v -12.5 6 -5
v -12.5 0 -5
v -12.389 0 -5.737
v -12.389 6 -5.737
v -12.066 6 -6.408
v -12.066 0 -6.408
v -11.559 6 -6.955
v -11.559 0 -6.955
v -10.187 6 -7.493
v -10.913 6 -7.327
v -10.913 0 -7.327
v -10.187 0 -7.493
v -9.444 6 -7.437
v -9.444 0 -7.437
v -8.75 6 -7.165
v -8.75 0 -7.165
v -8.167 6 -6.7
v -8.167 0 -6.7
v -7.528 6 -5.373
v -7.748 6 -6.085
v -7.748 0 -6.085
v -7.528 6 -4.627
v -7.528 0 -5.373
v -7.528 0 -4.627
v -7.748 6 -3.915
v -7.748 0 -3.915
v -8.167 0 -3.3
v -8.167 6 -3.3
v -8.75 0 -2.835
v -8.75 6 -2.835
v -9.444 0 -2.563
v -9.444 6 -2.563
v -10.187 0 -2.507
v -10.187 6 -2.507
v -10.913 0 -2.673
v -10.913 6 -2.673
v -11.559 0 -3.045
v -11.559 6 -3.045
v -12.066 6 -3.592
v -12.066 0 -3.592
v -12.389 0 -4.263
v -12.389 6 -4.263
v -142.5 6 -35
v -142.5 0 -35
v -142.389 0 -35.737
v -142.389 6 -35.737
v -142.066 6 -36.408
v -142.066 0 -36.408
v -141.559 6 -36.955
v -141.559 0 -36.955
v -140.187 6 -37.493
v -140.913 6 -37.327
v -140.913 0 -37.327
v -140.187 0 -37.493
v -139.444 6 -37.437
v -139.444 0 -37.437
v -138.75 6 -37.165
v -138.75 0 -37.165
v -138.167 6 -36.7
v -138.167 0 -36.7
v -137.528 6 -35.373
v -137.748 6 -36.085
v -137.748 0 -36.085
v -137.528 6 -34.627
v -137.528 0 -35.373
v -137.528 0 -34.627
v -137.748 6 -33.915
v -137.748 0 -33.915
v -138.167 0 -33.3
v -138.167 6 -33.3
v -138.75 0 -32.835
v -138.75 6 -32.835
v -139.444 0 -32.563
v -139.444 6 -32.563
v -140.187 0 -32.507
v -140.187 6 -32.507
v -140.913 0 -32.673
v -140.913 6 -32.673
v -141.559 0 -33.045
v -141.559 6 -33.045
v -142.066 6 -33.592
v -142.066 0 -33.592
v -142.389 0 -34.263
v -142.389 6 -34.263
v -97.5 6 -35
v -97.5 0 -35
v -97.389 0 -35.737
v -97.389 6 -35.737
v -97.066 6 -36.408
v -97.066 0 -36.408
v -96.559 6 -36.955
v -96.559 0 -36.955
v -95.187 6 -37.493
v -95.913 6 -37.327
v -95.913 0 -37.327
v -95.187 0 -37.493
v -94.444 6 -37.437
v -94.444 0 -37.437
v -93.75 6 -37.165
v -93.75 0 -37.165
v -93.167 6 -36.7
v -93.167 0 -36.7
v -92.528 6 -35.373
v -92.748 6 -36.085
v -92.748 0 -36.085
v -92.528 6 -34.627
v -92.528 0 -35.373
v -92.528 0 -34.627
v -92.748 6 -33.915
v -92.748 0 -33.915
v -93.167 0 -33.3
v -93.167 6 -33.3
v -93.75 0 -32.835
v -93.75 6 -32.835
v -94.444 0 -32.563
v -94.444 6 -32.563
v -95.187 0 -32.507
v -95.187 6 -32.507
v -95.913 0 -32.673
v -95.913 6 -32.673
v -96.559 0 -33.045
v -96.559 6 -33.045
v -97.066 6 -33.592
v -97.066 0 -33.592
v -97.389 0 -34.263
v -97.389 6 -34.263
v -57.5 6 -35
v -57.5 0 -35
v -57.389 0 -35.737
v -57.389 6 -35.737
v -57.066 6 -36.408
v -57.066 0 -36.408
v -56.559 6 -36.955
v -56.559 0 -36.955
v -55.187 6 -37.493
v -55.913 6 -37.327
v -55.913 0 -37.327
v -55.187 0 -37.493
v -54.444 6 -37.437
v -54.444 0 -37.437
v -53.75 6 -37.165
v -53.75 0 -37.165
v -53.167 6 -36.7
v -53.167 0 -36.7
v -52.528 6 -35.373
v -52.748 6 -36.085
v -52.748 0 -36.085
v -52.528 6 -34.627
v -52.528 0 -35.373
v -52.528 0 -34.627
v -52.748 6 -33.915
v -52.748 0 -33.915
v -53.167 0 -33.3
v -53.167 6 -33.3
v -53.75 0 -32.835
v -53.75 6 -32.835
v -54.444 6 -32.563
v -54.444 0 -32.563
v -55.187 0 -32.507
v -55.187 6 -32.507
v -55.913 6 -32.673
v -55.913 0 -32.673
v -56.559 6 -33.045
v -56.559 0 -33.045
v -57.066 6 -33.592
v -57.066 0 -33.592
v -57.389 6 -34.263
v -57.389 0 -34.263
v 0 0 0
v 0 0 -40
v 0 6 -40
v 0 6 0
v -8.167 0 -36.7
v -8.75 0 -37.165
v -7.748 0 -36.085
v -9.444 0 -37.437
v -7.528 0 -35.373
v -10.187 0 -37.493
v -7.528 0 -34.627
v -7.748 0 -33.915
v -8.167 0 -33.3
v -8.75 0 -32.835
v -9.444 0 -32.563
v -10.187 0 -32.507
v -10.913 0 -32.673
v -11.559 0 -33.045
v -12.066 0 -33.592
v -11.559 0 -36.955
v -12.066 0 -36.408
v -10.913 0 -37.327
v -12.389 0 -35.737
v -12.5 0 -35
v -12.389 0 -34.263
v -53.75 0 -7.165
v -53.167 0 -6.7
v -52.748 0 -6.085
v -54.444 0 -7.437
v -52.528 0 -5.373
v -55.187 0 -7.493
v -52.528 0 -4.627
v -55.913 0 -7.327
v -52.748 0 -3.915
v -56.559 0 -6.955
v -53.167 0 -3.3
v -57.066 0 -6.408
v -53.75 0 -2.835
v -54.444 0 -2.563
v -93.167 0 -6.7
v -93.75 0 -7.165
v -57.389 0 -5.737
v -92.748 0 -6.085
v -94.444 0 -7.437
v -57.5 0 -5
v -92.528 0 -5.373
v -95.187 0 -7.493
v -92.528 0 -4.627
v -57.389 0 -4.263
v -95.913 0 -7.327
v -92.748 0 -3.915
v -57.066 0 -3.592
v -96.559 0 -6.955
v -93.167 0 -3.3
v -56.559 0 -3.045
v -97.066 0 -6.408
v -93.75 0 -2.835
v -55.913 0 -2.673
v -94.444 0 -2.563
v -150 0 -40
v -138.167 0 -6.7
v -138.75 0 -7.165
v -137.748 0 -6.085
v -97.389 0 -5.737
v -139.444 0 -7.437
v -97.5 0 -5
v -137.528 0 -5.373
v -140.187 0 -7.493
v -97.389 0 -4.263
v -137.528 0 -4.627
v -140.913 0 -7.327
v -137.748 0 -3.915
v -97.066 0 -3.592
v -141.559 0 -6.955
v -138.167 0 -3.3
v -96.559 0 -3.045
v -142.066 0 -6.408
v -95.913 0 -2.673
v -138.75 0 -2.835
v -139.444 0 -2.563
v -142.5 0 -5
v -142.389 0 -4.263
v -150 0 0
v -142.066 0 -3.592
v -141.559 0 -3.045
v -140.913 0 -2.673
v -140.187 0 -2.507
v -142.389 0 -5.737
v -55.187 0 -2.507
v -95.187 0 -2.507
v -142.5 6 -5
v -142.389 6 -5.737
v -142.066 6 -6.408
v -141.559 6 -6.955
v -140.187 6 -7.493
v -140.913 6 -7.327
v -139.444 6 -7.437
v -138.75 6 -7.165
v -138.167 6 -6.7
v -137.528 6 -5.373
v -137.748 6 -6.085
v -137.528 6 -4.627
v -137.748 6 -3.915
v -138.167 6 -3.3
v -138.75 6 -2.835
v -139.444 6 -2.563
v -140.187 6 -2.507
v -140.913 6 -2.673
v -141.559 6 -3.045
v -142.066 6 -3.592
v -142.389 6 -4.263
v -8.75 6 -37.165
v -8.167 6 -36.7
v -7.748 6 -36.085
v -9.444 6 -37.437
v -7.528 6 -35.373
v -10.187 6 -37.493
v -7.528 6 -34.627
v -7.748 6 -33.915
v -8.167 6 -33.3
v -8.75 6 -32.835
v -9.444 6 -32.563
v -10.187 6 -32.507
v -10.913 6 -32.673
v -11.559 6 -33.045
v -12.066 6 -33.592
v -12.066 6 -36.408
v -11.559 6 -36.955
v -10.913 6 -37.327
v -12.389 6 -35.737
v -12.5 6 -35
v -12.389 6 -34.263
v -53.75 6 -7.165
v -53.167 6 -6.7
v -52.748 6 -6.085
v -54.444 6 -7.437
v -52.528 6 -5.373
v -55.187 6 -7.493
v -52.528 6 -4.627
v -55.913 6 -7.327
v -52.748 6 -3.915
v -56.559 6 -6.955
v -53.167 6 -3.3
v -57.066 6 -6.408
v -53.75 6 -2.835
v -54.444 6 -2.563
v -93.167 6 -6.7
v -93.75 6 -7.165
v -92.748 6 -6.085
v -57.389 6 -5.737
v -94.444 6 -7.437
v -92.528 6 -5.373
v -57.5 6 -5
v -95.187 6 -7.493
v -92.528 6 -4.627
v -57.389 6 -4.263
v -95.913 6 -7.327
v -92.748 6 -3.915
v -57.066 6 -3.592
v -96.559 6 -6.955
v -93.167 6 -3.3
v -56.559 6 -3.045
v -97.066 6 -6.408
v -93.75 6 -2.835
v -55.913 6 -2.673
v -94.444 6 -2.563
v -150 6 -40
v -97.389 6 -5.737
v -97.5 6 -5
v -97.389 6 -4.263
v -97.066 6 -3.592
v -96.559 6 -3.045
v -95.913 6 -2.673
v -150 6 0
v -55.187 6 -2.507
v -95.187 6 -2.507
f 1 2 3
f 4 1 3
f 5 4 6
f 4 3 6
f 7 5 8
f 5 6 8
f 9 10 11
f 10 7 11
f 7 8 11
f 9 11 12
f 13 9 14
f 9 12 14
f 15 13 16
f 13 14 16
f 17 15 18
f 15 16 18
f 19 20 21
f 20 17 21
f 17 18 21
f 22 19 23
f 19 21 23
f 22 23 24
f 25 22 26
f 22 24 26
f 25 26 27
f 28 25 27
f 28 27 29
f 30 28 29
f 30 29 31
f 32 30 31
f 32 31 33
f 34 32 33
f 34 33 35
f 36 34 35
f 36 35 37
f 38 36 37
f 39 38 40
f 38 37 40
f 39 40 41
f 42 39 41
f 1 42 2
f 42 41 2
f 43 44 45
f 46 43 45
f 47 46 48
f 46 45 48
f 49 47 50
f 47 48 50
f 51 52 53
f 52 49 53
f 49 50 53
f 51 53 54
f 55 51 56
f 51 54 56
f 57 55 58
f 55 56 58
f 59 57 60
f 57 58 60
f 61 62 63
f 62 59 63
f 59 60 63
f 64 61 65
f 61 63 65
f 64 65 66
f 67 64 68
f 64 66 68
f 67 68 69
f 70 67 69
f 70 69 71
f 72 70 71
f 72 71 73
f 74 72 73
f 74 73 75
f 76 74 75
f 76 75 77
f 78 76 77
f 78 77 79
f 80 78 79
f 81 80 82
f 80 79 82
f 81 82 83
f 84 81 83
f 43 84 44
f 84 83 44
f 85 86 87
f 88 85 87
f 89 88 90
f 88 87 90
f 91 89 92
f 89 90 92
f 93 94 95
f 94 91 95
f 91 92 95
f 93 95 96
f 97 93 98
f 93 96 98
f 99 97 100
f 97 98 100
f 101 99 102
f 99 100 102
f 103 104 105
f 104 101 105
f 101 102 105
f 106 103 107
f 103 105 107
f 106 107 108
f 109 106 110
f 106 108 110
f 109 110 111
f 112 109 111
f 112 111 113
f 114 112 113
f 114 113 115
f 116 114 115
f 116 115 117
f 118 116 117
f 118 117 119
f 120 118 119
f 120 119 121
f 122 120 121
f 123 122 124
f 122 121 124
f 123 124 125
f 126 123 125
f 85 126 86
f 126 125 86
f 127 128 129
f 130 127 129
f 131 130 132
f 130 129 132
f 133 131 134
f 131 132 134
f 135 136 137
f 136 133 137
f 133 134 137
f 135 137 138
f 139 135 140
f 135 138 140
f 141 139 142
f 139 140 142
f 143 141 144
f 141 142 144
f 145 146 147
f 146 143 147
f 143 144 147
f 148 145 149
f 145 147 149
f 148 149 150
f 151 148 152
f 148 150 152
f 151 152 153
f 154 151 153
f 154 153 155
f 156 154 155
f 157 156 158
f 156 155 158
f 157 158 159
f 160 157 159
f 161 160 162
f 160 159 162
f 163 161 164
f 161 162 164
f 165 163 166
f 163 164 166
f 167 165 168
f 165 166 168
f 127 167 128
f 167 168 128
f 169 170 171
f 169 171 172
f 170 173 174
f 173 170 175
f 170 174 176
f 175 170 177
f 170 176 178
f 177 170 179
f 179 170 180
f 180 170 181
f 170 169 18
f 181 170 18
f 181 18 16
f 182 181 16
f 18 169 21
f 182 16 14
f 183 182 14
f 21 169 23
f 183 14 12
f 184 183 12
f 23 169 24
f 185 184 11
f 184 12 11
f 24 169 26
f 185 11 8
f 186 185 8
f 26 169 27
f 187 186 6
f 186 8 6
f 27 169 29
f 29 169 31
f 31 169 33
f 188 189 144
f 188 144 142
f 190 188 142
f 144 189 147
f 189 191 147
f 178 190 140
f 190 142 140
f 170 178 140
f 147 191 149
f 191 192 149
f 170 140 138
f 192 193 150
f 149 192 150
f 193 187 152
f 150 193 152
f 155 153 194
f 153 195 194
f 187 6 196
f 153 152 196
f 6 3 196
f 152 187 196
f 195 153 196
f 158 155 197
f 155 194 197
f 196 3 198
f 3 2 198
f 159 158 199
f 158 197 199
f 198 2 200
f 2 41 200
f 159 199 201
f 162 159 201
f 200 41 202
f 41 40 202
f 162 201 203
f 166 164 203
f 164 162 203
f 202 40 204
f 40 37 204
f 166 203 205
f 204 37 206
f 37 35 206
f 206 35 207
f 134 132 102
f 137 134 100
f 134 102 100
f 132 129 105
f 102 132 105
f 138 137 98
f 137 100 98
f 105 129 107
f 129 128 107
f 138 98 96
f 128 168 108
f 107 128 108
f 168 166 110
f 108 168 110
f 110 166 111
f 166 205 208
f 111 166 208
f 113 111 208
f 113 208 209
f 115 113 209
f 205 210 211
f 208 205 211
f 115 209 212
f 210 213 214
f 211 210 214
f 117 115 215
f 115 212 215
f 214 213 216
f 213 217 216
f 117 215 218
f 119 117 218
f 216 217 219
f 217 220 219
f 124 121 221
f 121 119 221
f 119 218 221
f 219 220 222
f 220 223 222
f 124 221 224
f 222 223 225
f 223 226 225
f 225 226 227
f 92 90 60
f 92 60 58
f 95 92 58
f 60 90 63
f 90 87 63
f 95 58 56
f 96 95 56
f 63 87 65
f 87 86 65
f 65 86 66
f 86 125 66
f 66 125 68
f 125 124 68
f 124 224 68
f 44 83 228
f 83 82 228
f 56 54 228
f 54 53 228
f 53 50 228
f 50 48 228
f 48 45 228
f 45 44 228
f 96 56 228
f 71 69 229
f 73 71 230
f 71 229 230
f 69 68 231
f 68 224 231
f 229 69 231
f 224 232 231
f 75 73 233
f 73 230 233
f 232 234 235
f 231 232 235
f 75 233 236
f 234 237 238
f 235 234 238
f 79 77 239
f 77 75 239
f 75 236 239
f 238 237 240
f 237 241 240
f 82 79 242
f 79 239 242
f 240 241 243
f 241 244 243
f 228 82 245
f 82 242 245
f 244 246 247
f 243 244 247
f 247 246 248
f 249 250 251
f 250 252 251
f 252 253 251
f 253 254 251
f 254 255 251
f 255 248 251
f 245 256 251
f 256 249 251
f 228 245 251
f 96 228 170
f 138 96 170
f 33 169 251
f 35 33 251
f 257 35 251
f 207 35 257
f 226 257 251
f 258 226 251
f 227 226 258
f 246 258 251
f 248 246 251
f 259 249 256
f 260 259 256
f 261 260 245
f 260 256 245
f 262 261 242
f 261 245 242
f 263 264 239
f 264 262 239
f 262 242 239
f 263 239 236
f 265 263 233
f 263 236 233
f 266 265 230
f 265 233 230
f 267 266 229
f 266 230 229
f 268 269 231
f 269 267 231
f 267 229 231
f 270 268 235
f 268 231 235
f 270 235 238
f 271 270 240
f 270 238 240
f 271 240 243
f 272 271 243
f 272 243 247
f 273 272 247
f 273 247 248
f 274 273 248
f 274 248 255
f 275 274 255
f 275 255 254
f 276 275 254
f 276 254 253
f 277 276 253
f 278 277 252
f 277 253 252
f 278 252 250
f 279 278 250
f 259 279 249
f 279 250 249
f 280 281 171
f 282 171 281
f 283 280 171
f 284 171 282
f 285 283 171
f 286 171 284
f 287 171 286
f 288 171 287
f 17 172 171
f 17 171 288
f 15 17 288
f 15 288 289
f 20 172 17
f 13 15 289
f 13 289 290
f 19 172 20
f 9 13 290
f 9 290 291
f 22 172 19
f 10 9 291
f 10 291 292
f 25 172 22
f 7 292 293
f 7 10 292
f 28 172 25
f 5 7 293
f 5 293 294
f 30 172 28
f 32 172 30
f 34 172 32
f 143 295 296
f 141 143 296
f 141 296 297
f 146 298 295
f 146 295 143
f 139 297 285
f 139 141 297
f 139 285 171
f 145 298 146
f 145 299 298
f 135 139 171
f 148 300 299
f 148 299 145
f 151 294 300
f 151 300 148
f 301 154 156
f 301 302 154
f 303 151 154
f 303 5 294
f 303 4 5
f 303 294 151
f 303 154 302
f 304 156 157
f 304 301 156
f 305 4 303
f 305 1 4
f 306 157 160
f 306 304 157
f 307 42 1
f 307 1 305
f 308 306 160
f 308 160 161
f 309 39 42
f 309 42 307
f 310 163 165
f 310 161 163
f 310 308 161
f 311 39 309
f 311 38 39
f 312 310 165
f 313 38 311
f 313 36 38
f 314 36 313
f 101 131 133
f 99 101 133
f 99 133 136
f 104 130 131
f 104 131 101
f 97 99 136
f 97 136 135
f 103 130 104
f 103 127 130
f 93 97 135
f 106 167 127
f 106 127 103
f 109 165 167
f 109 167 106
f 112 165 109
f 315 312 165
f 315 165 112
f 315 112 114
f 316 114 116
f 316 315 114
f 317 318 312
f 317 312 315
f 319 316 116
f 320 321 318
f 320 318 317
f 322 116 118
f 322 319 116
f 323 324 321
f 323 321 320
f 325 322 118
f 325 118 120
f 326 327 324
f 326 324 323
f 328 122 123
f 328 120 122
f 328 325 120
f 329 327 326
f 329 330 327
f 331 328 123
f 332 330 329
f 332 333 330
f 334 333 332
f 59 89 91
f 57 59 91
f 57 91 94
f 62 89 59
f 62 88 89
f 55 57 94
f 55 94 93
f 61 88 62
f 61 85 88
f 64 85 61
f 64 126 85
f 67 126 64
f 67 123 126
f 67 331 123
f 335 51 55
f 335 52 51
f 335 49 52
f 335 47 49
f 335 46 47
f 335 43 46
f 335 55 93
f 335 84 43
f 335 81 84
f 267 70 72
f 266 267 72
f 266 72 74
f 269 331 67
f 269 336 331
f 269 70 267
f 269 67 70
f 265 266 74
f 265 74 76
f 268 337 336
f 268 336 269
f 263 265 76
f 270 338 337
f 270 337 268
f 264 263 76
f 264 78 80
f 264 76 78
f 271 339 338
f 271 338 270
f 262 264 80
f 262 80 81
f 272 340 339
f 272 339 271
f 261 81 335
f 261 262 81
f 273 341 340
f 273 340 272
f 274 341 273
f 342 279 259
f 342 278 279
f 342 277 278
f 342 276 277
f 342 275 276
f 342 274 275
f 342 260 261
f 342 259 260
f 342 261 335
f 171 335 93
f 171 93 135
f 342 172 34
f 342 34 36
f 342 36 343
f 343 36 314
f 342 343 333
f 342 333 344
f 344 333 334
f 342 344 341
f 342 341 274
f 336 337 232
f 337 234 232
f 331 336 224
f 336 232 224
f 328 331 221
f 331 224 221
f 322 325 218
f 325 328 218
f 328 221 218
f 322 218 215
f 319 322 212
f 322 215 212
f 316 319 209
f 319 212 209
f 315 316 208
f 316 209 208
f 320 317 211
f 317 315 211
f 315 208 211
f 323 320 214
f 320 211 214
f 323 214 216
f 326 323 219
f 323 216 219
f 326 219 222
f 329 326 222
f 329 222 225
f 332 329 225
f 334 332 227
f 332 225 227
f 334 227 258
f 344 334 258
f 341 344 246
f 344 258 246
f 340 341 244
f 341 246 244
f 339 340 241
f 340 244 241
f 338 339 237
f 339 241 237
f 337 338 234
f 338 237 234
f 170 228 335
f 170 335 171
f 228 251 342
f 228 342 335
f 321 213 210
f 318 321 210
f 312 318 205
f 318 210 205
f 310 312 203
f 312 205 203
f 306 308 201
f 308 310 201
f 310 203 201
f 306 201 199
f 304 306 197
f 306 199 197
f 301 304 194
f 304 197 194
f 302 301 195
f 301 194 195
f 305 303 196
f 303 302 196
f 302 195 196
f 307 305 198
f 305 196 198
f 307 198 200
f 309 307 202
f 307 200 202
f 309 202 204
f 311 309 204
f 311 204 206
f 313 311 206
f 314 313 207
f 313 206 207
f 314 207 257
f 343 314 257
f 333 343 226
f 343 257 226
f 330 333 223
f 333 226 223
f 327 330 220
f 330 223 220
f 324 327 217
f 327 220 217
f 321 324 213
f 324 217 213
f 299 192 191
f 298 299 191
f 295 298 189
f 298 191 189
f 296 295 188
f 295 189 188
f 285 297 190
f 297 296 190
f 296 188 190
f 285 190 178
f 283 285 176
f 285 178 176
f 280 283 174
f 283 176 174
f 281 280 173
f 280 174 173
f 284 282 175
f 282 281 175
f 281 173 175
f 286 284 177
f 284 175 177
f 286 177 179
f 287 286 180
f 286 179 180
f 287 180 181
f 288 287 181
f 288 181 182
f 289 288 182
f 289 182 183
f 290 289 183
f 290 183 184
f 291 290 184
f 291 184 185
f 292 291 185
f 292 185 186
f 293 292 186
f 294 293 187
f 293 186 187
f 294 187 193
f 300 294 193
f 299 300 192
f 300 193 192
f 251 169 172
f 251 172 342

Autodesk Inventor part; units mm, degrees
ref_plane "YZ Plane" through (0, 0, 0) normal (1, 0, 0) x (0, 1, 0)
ref_plane "XZ Plane" through (0, 0, 0) normal (0, 1, 0) x (-1, 0, 0)
ref_plane "XY Plane" through (0, 0, 0) normal (0, 0, 1) x (1, 0, 0)
sketch "Esquisse1" plane through (0, 0, 0) normal (0, 1, 0) x (-1, 0, 0)
  line L0 (0, 0) -> (150, 0)
  line L1 (150, 0) -> (150, -40)
  line L2 (150, -40) -> (0, -40)
  line L3 (0, -40) -> (0, 0)
  line L4 (150, -20) -> (0, -20) construction
  line L5 (150, -10) -> (0, -10) construction
  line L6 (150, -30) -> (0, -30) construction
  circle A0 centre (95, -5) radius 2.5
  line L7 (75, 0) -> (75, -40) construction
  circle A1 centre (55, -5) radius 2.5
  circle A2 centre (95, -35) radius 2.5
  circle A3 centre (55, -35) radius 2.5
  circle A4 centre (140, -5) radius 2.5
  circle A5 centre (140, -35) radius 2.5
  circle A6 centre (10, -5) radius 2.5
  circle A7 centre (10, -35) radius 2.5
  dimension "d0" = 150
  dimension "d2" = 10
  dimension "d3" = 10
  dimension "d4" = 5
  dimension "d12" = 5
  dimension "d13" = 20
  dimension "d14" = 20
  dimension "d15" = 5
  dimension "d16" = 10
  dimension "d17" = 5
extrude "Extrusion1" add sketch "Esquisse1" along normal blind 6
equation "\"d3\" = d2"
equation "\"d17\" = d12"
properties part number "hold_motor_bottom" material "Bois (cerisier)"
